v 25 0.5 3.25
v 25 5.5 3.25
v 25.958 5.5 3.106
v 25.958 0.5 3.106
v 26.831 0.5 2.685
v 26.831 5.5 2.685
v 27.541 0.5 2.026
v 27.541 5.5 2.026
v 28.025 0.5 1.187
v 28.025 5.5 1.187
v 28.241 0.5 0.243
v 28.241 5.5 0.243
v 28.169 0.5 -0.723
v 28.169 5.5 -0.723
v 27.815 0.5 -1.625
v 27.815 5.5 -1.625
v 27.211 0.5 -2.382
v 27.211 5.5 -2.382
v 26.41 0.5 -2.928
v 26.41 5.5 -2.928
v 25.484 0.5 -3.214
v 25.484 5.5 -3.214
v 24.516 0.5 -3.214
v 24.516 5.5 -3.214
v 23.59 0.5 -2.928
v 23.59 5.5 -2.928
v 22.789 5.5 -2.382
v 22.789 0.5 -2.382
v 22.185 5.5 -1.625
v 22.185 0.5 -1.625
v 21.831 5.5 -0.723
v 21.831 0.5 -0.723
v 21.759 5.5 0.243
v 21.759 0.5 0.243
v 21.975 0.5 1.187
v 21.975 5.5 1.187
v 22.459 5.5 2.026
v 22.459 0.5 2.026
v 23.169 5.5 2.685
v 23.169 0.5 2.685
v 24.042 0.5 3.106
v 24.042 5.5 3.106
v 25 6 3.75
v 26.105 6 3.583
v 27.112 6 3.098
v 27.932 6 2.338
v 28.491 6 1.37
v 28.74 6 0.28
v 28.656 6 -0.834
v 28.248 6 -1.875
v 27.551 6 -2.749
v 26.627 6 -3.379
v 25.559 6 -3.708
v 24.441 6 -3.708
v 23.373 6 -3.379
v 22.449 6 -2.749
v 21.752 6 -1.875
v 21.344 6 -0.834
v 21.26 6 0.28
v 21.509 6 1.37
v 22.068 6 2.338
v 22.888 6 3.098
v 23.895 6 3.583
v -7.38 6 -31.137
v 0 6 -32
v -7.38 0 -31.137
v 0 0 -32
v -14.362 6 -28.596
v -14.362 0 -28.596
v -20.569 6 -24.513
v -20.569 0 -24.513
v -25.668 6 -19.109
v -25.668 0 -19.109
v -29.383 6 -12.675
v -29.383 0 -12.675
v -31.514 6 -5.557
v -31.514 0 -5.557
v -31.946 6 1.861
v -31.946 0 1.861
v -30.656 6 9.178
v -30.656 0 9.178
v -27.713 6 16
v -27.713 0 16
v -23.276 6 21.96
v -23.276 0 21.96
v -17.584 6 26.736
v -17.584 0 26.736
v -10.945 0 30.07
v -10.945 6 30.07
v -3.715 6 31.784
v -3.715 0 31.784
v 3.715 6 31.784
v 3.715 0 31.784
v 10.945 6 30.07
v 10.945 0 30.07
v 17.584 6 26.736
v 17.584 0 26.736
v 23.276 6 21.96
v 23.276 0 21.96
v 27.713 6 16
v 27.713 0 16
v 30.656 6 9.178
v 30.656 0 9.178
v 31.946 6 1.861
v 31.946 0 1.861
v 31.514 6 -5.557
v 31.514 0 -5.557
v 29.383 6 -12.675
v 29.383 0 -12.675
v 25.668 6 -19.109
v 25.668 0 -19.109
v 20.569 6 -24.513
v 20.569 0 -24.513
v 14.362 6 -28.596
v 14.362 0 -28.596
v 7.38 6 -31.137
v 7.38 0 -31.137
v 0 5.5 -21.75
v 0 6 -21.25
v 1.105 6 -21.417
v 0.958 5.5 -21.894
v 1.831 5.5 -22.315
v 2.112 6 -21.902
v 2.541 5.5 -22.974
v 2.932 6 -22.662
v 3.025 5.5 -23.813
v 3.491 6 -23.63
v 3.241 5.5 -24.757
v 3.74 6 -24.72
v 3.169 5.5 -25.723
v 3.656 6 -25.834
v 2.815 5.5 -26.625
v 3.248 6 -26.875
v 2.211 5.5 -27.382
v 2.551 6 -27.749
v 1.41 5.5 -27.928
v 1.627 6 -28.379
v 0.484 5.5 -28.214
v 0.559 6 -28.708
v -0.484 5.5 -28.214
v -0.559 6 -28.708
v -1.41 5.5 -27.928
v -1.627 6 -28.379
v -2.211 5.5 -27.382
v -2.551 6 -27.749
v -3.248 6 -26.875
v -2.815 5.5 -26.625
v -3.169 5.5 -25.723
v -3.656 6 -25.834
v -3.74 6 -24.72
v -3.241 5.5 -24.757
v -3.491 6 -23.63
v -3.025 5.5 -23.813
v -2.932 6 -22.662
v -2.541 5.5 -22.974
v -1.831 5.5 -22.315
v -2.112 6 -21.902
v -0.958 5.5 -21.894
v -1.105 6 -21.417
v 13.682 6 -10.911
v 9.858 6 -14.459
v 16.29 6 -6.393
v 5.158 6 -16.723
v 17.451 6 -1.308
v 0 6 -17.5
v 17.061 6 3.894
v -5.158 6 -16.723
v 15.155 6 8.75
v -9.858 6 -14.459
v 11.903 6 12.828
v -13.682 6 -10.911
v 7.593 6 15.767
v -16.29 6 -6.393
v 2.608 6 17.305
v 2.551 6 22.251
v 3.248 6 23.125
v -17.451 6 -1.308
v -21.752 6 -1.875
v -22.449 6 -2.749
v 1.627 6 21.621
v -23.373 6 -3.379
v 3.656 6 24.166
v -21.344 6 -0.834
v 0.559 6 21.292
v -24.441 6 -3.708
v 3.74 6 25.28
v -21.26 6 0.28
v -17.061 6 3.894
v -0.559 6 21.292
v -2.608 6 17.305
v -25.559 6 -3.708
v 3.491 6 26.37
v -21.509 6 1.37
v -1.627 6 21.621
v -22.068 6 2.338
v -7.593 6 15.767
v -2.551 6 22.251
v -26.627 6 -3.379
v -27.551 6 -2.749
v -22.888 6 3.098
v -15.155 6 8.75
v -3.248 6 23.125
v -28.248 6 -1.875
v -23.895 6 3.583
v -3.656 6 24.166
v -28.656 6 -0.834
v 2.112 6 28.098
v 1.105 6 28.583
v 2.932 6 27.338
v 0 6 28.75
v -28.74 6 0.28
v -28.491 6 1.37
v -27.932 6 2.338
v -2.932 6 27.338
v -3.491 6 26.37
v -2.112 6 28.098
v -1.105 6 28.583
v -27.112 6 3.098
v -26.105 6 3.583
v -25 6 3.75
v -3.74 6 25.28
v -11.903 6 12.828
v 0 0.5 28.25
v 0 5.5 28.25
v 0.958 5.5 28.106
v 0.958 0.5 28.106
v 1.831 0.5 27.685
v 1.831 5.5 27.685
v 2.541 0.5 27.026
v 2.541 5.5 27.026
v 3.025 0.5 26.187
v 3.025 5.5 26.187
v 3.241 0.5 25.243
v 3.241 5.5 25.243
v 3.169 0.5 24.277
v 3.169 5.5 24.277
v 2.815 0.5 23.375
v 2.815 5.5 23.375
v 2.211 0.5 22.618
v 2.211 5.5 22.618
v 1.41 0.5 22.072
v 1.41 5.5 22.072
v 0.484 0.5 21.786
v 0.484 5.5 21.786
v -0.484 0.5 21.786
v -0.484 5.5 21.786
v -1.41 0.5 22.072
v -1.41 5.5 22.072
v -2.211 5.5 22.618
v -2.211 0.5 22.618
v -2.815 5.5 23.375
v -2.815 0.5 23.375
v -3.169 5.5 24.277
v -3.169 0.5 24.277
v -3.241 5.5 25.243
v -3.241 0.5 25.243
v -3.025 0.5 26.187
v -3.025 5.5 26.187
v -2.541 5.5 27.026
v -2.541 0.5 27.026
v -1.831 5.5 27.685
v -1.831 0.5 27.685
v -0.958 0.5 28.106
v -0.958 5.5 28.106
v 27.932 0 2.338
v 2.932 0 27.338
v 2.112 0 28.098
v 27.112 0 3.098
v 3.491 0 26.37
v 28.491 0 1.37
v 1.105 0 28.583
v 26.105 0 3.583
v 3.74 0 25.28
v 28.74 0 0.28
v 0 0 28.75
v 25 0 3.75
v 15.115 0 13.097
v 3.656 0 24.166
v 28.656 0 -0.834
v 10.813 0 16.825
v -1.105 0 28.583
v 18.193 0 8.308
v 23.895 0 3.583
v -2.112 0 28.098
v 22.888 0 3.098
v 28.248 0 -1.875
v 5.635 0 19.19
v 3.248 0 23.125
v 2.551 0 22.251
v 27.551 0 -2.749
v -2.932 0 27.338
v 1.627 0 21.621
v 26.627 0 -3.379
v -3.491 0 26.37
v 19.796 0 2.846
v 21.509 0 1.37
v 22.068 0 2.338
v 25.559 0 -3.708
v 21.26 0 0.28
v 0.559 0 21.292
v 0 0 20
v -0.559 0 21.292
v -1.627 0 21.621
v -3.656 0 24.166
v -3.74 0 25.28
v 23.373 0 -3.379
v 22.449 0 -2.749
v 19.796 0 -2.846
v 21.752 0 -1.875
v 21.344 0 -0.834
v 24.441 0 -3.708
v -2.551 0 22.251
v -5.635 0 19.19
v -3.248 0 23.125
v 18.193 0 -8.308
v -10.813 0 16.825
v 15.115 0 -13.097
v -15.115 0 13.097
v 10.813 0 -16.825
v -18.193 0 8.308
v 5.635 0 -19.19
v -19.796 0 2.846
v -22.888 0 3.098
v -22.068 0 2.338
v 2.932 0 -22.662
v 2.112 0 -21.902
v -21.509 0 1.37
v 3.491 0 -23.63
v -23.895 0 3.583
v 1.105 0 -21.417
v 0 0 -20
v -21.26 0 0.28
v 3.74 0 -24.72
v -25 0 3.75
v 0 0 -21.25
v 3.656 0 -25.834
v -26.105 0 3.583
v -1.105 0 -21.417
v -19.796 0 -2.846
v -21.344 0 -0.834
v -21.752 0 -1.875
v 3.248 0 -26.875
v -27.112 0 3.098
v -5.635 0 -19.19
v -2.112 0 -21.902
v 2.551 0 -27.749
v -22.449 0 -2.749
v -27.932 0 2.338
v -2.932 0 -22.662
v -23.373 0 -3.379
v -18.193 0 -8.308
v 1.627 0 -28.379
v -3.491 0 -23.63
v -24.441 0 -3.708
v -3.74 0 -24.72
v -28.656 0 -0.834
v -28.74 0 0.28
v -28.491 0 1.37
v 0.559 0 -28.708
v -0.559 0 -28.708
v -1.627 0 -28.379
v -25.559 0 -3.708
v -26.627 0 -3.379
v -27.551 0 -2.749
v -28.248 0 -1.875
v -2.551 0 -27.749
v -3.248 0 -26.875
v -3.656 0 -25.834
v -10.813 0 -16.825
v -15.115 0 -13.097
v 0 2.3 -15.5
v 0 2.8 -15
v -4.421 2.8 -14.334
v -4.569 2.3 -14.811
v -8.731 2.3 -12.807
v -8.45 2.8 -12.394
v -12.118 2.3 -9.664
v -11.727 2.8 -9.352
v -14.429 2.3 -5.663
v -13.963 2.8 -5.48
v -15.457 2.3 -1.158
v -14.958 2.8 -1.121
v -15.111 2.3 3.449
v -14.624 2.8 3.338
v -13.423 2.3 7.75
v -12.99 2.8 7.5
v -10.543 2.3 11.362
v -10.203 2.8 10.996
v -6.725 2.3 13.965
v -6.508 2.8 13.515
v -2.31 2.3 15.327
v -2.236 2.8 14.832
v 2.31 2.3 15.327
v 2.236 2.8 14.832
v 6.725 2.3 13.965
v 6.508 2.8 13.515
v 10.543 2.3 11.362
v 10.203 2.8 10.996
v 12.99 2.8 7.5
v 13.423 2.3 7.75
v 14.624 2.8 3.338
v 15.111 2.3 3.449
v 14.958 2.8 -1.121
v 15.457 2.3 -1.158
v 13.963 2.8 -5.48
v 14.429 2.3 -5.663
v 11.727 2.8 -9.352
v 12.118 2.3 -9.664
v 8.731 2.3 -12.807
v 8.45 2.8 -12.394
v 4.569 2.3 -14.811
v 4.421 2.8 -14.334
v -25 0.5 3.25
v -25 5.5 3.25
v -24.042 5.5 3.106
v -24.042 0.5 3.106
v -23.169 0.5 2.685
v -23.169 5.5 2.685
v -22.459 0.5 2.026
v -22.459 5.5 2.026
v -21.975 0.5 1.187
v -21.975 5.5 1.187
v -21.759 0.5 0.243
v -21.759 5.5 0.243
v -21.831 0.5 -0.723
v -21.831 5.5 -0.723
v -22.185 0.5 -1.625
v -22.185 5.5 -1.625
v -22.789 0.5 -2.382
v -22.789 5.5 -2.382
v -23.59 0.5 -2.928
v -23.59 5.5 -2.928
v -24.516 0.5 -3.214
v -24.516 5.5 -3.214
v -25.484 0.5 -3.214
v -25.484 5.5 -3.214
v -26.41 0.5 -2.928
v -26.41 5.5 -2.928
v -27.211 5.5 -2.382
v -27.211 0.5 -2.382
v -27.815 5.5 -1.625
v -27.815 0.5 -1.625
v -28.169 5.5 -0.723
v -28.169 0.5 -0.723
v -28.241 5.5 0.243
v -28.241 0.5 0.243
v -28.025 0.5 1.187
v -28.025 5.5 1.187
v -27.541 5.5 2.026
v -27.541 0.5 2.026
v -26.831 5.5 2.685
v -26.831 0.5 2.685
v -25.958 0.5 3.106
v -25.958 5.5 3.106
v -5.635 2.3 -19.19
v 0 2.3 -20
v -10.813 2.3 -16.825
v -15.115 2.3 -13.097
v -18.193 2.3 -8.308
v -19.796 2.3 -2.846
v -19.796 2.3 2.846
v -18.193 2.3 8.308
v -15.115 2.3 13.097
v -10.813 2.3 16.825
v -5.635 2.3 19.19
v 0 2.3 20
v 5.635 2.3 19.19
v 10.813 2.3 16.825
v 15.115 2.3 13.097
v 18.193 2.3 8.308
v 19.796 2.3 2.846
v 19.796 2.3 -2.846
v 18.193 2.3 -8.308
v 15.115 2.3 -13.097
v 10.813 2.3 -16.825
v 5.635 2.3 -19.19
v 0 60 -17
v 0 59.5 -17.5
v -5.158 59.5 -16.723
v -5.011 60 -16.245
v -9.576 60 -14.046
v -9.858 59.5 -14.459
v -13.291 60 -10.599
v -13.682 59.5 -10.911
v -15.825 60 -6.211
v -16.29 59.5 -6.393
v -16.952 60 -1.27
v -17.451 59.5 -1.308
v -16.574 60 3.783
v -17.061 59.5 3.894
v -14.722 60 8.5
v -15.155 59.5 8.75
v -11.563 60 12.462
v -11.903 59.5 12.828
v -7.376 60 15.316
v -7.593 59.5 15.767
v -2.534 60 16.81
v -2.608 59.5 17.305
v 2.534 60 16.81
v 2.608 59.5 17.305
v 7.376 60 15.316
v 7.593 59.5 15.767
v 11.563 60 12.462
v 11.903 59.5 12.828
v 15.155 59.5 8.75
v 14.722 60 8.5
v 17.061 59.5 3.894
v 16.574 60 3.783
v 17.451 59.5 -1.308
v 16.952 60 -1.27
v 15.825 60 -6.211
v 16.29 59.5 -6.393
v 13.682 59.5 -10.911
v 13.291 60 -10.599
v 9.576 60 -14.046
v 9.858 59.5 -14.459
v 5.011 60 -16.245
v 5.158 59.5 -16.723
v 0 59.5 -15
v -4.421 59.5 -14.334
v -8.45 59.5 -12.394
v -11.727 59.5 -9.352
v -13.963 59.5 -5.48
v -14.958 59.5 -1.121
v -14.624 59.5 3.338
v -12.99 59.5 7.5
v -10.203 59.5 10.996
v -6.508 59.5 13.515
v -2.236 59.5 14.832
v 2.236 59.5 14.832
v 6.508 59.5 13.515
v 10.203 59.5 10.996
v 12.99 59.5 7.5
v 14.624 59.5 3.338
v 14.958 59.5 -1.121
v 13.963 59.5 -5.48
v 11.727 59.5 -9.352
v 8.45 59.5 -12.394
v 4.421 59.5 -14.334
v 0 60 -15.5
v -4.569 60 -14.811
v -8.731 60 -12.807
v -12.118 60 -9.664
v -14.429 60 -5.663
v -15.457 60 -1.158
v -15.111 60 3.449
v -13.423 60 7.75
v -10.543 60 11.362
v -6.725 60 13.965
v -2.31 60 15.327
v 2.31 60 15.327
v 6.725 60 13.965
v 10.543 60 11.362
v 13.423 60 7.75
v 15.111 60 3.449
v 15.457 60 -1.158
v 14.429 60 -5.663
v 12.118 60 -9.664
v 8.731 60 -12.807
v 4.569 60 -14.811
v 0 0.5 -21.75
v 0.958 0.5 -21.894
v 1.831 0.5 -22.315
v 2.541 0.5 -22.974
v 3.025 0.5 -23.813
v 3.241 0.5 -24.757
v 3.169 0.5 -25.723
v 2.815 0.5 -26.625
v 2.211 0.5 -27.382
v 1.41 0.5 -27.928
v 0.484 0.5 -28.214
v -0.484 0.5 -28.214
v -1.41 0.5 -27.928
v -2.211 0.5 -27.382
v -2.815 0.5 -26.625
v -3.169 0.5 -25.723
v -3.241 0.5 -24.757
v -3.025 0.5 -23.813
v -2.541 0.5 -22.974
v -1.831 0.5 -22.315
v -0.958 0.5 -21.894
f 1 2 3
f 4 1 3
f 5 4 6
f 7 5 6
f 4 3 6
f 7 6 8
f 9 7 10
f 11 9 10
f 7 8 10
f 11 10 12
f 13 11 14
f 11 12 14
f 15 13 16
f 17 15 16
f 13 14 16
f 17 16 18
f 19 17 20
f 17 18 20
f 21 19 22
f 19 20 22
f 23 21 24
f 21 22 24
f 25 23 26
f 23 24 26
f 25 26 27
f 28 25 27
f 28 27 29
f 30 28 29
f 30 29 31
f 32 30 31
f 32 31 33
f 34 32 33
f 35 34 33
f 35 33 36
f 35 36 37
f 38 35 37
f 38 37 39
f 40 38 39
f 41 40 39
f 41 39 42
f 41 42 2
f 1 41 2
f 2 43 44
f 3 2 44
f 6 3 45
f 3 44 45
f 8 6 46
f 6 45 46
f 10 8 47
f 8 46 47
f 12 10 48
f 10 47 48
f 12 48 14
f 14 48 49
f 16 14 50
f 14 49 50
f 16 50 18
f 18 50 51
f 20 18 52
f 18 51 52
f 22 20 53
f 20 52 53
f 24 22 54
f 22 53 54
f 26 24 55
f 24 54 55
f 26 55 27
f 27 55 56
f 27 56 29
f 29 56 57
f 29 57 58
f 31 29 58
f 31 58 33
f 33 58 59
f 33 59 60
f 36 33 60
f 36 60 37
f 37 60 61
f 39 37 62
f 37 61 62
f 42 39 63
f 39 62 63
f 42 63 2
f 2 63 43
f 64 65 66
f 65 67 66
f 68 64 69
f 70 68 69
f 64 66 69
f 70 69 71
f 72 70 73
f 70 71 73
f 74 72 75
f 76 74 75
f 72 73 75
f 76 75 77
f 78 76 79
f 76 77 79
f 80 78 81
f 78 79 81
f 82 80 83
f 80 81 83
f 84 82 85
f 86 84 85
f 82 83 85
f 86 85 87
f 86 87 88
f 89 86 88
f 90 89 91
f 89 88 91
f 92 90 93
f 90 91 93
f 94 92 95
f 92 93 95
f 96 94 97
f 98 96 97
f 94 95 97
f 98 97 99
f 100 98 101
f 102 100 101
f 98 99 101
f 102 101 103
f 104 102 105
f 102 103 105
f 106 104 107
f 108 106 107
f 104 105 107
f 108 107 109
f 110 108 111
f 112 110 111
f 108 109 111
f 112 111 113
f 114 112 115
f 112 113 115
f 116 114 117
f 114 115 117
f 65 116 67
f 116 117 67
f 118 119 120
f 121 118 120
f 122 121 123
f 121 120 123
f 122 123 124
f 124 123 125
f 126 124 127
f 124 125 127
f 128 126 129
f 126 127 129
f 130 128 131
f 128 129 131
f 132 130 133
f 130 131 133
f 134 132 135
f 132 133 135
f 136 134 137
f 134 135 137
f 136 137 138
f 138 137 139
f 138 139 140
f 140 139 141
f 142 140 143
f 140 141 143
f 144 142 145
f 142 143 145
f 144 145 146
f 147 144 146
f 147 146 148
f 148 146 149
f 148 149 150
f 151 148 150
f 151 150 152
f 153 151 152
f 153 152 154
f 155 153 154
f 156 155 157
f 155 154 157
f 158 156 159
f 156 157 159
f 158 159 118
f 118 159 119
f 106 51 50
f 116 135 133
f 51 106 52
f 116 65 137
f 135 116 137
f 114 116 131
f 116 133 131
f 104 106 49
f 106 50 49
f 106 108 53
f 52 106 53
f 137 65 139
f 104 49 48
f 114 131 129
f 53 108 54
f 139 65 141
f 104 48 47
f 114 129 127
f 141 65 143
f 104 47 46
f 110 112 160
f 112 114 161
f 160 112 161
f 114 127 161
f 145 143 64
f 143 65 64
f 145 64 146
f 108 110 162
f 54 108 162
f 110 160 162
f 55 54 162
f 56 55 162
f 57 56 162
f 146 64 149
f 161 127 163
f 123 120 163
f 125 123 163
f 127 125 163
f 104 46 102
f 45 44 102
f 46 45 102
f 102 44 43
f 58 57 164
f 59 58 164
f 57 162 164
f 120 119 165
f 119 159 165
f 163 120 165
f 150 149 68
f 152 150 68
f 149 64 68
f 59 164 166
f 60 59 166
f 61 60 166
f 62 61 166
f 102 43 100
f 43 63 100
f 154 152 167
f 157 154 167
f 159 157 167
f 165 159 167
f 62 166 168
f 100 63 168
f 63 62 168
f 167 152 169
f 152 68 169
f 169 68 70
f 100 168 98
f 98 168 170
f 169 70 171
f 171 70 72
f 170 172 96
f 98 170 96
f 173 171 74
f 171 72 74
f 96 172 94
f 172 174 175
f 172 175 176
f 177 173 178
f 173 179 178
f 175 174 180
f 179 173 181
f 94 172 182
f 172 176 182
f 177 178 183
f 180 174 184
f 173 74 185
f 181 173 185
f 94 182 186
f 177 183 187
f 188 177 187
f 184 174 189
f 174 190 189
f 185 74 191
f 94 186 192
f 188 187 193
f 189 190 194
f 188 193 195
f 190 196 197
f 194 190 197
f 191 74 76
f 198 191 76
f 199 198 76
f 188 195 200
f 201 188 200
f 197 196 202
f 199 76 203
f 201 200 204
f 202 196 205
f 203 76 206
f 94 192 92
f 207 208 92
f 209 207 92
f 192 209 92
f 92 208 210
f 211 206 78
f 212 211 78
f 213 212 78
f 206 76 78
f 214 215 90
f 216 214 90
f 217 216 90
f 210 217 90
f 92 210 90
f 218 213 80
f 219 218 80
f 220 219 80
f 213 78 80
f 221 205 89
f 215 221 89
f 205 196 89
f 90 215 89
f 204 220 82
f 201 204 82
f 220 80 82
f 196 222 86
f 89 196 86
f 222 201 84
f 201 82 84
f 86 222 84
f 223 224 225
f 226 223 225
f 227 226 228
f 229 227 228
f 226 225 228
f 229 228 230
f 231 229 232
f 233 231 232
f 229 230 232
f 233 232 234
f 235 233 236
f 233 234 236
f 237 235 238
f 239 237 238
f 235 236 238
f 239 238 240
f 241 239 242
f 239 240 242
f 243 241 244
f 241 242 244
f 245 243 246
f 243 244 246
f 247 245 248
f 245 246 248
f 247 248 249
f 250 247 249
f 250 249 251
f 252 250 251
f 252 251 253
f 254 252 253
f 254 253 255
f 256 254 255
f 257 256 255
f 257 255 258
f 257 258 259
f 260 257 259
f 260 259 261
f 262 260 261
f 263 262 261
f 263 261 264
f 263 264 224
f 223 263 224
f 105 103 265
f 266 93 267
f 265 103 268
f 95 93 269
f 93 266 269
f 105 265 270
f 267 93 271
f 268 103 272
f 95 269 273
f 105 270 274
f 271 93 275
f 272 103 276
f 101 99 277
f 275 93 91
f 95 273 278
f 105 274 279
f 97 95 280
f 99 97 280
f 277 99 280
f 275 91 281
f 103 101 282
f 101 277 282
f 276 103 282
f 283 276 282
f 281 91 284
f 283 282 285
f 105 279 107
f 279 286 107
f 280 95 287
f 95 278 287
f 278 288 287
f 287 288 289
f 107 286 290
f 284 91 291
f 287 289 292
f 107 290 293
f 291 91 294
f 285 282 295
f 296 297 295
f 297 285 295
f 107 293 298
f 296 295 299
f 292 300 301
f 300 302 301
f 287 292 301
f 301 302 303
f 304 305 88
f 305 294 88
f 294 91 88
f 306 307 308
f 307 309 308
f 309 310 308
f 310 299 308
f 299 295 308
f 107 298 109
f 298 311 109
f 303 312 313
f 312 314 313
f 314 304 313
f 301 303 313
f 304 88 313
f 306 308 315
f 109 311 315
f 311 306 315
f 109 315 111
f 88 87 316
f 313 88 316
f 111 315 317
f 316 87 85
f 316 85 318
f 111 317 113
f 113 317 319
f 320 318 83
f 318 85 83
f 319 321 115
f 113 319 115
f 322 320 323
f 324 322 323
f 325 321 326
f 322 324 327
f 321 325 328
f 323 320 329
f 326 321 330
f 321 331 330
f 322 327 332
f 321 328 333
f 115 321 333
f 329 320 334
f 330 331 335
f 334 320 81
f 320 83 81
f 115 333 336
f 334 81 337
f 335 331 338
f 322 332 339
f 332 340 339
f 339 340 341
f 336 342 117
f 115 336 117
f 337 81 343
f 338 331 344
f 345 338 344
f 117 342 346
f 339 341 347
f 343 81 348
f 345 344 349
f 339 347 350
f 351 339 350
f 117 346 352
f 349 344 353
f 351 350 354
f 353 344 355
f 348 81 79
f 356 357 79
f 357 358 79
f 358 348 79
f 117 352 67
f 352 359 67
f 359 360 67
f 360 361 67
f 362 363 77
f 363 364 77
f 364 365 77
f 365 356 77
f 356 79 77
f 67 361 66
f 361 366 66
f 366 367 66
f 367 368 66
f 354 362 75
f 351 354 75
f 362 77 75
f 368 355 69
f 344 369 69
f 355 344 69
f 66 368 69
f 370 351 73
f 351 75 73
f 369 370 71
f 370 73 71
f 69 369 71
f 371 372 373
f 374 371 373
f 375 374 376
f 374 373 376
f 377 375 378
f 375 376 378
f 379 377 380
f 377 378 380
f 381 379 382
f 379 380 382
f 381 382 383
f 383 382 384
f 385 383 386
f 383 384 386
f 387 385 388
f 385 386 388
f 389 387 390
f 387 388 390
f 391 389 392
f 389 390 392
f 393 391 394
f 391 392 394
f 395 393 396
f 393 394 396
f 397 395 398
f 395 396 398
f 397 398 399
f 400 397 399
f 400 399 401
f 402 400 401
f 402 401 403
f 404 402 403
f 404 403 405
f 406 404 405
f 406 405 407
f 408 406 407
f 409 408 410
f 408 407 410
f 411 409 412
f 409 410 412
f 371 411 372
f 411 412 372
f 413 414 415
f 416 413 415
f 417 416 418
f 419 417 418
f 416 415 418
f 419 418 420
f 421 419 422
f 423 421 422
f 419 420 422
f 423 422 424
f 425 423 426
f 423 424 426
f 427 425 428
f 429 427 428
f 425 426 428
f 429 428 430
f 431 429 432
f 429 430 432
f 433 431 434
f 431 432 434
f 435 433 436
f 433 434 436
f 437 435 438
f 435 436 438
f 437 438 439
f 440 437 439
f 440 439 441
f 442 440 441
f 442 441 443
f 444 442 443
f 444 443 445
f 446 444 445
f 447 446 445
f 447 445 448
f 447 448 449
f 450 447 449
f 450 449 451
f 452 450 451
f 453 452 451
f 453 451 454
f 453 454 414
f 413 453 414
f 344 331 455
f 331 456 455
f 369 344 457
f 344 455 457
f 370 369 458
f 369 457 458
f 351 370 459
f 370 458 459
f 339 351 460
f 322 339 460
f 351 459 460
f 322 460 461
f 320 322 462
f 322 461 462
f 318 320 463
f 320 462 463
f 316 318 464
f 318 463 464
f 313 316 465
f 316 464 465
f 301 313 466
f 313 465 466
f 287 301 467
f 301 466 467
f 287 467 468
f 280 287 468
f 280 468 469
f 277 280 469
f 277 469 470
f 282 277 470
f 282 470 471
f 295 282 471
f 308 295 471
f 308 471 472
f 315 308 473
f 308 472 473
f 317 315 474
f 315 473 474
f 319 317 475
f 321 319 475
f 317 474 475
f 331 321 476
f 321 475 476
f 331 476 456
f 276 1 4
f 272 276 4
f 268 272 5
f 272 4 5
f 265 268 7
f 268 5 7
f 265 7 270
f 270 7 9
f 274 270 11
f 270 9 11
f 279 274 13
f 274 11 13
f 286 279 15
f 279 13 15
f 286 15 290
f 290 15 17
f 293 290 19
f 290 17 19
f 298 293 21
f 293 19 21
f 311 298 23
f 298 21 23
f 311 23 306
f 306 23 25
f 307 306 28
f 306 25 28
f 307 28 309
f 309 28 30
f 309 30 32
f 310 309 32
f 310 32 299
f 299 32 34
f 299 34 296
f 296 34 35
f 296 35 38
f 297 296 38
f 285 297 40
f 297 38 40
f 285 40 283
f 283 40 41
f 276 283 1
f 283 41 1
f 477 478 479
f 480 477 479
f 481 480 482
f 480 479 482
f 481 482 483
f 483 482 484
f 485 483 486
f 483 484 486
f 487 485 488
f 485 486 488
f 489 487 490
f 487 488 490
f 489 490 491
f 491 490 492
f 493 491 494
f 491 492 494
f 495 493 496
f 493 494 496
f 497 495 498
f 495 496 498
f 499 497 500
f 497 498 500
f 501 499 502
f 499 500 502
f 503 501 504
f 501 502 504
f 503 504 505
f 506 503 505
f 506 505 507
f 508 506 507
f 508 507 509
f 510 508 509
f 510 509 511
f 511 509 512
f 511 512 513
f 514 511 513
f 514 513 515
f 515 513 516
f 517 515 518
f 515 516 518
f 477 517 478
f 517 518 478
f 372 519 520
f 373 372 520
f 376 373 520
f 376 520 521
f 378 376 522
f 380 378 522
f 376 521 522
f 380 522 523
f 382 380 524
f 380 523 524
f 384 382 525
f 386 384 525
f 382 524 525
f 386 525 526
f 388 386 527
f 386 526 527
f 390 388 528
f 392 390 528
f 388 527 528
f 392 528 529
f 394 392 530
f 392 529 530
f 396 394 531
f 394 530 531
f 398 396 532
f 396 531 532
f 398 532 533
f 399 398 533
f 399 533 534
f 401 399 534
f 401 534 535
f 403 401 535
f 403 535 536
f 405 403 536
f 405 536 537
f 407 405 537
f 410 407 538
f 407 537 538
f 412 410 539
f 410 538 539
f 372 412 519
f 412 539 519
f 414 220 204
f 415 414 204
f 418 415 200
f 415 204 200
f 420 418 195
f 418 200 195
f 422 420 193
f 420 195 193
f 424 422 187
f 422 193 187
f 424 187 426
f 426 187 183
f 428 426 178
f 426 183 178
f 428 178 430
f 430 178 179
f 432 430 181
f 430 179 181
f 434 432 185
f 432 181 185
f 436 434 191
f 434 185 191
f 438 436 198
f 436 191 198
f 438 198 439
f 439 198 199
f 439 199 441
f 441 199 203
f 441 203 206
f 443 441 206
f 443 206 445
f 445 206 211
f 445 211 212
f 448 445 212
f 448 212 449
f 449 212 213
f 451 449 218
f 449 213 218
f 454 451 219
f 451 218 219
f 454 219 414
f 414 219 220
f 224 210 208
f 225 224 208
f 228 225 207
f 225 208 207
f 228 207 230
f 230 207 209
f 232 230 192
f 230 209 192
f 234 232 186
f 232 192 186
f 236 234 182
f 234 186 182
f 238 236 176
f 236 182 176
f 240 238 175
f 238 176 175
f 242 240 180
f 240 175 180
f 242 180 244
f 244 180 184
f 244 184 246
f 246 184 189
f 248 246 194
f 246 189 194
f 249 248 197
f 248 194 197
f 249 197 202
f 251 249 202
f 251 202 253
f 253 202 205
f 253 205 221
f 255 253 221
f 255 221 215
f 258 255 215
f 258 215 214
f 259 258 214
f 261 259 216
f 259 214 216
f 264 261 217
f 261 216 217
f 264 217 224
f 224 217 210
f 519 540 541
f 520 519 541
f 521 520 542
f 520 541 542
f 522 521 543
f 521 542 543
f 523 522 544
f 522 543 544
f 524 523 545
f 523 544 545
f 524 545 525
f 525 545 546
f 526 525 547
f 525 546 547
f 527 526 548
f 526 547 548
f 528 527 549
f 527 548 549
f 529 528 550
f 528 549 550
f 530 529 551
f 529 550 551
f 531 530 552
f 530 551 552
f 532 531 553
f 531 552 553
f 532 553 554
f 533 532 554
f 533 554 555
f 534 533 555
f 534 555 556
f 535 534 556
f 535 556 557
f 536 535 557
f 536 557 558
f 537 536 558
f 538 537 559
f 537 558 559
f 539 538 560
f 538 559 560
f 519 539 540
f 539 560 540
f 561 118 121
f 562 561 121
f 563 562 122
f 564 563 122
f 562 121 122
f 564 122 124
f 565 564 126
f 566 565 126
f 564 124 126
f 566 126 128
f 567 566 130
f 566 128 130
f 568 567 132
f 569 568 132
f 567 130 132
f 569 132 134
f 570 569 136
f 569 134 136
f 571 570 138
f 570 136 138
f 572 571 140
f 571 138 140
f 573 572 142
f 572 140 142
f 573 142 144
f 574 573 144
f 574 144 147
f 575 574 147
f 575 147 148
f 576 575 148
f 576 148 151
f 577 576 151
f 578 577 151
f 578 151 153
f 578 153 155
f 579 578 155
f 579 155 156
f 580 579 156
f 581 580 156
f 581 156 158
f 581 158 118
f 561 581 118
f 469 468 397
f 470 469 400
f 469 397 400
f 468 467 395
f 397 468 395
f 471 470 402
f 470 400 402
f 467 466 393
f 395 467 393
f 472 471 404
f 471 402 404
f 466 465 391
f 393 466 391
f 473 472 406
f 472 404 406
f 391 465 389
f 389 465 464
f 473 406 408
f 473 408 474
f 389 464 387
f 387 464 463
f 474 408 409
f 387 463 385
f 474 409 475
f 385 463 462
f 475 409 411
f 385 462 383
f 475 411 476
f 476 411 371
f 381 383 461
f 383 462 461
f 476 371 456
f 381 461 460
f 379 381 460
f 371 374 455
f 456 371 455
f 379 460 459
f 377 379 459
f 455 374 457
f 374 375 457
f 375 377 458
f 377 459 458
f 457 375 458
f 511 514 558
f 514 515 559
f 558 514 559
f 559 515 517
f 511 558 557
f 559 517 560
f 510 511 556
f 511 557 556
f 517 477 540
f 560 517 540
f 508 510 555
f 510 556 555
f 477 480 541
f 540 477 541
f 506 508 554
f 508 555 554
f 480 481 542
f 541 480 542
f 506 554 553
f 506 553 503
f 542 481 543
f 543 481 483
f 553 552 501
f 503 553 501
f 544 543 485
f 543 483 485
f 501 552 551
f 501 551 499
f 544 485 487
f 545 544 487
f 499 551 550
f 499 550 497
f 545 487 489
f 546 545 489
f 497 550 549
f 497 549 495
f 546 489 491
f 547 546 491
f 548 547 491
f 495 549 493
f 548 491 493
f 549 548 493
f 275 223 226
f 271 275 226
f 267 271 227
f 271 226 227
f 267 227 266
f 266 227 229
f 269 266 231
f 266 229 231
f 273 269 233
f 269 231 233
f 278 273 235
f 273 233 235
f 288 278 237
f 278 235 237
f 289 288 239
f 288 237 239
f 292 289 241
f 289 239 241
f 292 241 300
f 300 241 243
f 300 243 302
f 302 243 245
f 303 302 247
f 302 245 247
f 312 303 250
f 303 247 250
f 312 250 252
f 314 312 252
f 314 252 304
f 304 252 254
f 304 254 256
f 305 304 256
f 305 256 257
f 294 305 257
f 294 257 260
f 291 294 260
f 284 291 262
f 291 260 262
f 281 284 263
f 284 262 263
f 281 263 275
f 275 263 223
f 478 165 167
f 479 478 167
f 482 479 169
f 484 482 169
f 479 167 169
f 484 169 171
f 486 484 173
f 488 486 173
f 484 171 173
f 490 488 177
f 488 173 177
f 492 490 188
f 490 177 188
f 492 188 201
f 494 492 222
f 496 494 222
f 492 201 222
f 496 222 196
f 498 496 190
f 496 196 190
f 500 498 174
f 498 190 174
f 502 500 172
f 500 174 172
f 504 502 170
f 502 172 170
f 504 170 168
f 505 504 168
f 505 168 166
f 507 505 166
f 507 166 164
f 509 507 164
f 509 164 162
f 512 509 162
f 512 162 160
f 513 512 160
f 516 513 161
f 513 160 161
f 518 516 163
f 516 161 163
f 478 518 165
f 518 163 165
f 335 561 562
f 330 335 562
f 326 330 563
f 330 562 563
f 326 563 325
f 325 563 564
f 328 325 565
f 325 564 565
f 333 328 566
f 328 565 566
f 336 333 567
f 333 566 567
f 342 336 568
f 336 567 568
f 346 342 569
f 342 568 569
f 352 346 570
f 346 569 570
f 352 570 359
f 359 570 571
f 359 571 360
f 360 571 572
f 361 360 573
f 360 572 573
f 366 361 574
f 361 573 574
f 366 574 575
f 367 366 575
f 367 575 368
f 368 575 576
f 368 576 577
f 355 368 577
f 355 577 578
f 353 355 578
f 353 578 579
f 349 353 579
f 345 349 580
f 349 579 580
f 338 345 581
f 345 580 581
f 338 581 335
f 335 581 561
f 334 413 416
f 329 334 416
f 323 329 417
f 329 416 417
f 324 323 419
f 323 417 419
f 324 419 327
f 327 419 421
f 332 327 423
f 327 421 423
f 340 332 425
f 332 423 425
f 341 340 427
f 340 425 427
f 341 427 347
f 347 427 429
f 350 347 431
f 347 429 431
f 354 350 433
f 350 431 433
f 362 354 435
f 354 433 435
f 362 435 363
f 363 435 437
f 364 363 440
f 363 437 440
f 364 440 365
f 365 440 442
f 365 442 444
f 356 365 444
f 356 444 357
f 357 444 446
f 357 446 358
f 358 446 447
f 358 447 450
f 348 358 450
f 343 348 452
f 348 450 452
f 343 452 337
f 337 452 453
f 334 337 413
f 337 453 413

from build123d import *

# Parameters (mm, degrees)
CHAMFER1_SIZE      = 0.5
SKETCH2_R          = 3.25
CUT_EXTRUDE1_DEPTH = 71.455659815
CHAMFER2_SIZE      = 0.5
CHAMFER3_SIZE      = 0.5


with BuildPart() as part:
    # Sketch1 → Revolve1 (revolve)
    with BuildSketch(Plane.XY, mode=Mode.PRIVATE) as revolve1_sk:
        Polygon((-15, 2.3), (-15, 60), (-17.5, 60), (-17.5, 6), (-32, 6), (-32, 0), (-20, 0), (-20, 2.3), align=None)
    revolve(revolve1_sk.sketch.rotate(Axis((0, 0, 0), (0, 1, 0)), 270), axis=Axis((0, 0, 0), (0, 1, 0)))

    # Chamfer1
    chamfer1_edges = [part.edges().sort_by_distance(p)[0] for p in [
        (0, 60, 17.5),
        (0, 60, 15),
    ]]
    chamfer(chamfer1_edges, length=CHAMFER1_SIZE)

    # Sketch2 → Cut-Extrude1 (cut, through all)
    with BuildSketch(Plane(origin=(0, 6, 0), x_dir=(1, 0, 0), z_dir=(0, 1, 0))):
        with Locations(Location((0, 25, 0), (0, 0, 270))):
            Circle(SKETCH2_R)
        with Locations(Location((25, 0, 0), (0, 0, 270))):
            Circle(SKETCH2_R)
        with Locations(Location((0, -25, 0), (0, 0, 270))):
            Circle(SKETCH2_R)
        with Locations(Location((-25, 0, 0), (0, 0, 270))):
            Circle(SKETCH2_R)
    extrude(amount=-CUT_EXTRUDE1_DEPTH, mode=Mode.SUBTRACT)

    # Chamfer2
    chamfer2_edges = [part.edges().sort_by_distance(p)[0] for p in [
        (0, 0, -28.25),
        (0, 6, -28.25),
        (25, 0, -3.25),
        (25, 6, -3.25),
        (0, 0, 21.75),
        (0, 6, 21.75),
        (-25, 0, -3.25),
        (-25, 6, -3.25),
    ]]
    chamfer(chamfer2_edges, length=CHAMFER2_SIZE)

    # Chamfer3
    chamfer3_edges = [part.edges().sort_by_distance(p)[0] for p in [
        (0, 2.3, 15),
    ]]
    chamfer(chamfer3_edges, length=CHAMFER3_SIZE)


solid = part.part
